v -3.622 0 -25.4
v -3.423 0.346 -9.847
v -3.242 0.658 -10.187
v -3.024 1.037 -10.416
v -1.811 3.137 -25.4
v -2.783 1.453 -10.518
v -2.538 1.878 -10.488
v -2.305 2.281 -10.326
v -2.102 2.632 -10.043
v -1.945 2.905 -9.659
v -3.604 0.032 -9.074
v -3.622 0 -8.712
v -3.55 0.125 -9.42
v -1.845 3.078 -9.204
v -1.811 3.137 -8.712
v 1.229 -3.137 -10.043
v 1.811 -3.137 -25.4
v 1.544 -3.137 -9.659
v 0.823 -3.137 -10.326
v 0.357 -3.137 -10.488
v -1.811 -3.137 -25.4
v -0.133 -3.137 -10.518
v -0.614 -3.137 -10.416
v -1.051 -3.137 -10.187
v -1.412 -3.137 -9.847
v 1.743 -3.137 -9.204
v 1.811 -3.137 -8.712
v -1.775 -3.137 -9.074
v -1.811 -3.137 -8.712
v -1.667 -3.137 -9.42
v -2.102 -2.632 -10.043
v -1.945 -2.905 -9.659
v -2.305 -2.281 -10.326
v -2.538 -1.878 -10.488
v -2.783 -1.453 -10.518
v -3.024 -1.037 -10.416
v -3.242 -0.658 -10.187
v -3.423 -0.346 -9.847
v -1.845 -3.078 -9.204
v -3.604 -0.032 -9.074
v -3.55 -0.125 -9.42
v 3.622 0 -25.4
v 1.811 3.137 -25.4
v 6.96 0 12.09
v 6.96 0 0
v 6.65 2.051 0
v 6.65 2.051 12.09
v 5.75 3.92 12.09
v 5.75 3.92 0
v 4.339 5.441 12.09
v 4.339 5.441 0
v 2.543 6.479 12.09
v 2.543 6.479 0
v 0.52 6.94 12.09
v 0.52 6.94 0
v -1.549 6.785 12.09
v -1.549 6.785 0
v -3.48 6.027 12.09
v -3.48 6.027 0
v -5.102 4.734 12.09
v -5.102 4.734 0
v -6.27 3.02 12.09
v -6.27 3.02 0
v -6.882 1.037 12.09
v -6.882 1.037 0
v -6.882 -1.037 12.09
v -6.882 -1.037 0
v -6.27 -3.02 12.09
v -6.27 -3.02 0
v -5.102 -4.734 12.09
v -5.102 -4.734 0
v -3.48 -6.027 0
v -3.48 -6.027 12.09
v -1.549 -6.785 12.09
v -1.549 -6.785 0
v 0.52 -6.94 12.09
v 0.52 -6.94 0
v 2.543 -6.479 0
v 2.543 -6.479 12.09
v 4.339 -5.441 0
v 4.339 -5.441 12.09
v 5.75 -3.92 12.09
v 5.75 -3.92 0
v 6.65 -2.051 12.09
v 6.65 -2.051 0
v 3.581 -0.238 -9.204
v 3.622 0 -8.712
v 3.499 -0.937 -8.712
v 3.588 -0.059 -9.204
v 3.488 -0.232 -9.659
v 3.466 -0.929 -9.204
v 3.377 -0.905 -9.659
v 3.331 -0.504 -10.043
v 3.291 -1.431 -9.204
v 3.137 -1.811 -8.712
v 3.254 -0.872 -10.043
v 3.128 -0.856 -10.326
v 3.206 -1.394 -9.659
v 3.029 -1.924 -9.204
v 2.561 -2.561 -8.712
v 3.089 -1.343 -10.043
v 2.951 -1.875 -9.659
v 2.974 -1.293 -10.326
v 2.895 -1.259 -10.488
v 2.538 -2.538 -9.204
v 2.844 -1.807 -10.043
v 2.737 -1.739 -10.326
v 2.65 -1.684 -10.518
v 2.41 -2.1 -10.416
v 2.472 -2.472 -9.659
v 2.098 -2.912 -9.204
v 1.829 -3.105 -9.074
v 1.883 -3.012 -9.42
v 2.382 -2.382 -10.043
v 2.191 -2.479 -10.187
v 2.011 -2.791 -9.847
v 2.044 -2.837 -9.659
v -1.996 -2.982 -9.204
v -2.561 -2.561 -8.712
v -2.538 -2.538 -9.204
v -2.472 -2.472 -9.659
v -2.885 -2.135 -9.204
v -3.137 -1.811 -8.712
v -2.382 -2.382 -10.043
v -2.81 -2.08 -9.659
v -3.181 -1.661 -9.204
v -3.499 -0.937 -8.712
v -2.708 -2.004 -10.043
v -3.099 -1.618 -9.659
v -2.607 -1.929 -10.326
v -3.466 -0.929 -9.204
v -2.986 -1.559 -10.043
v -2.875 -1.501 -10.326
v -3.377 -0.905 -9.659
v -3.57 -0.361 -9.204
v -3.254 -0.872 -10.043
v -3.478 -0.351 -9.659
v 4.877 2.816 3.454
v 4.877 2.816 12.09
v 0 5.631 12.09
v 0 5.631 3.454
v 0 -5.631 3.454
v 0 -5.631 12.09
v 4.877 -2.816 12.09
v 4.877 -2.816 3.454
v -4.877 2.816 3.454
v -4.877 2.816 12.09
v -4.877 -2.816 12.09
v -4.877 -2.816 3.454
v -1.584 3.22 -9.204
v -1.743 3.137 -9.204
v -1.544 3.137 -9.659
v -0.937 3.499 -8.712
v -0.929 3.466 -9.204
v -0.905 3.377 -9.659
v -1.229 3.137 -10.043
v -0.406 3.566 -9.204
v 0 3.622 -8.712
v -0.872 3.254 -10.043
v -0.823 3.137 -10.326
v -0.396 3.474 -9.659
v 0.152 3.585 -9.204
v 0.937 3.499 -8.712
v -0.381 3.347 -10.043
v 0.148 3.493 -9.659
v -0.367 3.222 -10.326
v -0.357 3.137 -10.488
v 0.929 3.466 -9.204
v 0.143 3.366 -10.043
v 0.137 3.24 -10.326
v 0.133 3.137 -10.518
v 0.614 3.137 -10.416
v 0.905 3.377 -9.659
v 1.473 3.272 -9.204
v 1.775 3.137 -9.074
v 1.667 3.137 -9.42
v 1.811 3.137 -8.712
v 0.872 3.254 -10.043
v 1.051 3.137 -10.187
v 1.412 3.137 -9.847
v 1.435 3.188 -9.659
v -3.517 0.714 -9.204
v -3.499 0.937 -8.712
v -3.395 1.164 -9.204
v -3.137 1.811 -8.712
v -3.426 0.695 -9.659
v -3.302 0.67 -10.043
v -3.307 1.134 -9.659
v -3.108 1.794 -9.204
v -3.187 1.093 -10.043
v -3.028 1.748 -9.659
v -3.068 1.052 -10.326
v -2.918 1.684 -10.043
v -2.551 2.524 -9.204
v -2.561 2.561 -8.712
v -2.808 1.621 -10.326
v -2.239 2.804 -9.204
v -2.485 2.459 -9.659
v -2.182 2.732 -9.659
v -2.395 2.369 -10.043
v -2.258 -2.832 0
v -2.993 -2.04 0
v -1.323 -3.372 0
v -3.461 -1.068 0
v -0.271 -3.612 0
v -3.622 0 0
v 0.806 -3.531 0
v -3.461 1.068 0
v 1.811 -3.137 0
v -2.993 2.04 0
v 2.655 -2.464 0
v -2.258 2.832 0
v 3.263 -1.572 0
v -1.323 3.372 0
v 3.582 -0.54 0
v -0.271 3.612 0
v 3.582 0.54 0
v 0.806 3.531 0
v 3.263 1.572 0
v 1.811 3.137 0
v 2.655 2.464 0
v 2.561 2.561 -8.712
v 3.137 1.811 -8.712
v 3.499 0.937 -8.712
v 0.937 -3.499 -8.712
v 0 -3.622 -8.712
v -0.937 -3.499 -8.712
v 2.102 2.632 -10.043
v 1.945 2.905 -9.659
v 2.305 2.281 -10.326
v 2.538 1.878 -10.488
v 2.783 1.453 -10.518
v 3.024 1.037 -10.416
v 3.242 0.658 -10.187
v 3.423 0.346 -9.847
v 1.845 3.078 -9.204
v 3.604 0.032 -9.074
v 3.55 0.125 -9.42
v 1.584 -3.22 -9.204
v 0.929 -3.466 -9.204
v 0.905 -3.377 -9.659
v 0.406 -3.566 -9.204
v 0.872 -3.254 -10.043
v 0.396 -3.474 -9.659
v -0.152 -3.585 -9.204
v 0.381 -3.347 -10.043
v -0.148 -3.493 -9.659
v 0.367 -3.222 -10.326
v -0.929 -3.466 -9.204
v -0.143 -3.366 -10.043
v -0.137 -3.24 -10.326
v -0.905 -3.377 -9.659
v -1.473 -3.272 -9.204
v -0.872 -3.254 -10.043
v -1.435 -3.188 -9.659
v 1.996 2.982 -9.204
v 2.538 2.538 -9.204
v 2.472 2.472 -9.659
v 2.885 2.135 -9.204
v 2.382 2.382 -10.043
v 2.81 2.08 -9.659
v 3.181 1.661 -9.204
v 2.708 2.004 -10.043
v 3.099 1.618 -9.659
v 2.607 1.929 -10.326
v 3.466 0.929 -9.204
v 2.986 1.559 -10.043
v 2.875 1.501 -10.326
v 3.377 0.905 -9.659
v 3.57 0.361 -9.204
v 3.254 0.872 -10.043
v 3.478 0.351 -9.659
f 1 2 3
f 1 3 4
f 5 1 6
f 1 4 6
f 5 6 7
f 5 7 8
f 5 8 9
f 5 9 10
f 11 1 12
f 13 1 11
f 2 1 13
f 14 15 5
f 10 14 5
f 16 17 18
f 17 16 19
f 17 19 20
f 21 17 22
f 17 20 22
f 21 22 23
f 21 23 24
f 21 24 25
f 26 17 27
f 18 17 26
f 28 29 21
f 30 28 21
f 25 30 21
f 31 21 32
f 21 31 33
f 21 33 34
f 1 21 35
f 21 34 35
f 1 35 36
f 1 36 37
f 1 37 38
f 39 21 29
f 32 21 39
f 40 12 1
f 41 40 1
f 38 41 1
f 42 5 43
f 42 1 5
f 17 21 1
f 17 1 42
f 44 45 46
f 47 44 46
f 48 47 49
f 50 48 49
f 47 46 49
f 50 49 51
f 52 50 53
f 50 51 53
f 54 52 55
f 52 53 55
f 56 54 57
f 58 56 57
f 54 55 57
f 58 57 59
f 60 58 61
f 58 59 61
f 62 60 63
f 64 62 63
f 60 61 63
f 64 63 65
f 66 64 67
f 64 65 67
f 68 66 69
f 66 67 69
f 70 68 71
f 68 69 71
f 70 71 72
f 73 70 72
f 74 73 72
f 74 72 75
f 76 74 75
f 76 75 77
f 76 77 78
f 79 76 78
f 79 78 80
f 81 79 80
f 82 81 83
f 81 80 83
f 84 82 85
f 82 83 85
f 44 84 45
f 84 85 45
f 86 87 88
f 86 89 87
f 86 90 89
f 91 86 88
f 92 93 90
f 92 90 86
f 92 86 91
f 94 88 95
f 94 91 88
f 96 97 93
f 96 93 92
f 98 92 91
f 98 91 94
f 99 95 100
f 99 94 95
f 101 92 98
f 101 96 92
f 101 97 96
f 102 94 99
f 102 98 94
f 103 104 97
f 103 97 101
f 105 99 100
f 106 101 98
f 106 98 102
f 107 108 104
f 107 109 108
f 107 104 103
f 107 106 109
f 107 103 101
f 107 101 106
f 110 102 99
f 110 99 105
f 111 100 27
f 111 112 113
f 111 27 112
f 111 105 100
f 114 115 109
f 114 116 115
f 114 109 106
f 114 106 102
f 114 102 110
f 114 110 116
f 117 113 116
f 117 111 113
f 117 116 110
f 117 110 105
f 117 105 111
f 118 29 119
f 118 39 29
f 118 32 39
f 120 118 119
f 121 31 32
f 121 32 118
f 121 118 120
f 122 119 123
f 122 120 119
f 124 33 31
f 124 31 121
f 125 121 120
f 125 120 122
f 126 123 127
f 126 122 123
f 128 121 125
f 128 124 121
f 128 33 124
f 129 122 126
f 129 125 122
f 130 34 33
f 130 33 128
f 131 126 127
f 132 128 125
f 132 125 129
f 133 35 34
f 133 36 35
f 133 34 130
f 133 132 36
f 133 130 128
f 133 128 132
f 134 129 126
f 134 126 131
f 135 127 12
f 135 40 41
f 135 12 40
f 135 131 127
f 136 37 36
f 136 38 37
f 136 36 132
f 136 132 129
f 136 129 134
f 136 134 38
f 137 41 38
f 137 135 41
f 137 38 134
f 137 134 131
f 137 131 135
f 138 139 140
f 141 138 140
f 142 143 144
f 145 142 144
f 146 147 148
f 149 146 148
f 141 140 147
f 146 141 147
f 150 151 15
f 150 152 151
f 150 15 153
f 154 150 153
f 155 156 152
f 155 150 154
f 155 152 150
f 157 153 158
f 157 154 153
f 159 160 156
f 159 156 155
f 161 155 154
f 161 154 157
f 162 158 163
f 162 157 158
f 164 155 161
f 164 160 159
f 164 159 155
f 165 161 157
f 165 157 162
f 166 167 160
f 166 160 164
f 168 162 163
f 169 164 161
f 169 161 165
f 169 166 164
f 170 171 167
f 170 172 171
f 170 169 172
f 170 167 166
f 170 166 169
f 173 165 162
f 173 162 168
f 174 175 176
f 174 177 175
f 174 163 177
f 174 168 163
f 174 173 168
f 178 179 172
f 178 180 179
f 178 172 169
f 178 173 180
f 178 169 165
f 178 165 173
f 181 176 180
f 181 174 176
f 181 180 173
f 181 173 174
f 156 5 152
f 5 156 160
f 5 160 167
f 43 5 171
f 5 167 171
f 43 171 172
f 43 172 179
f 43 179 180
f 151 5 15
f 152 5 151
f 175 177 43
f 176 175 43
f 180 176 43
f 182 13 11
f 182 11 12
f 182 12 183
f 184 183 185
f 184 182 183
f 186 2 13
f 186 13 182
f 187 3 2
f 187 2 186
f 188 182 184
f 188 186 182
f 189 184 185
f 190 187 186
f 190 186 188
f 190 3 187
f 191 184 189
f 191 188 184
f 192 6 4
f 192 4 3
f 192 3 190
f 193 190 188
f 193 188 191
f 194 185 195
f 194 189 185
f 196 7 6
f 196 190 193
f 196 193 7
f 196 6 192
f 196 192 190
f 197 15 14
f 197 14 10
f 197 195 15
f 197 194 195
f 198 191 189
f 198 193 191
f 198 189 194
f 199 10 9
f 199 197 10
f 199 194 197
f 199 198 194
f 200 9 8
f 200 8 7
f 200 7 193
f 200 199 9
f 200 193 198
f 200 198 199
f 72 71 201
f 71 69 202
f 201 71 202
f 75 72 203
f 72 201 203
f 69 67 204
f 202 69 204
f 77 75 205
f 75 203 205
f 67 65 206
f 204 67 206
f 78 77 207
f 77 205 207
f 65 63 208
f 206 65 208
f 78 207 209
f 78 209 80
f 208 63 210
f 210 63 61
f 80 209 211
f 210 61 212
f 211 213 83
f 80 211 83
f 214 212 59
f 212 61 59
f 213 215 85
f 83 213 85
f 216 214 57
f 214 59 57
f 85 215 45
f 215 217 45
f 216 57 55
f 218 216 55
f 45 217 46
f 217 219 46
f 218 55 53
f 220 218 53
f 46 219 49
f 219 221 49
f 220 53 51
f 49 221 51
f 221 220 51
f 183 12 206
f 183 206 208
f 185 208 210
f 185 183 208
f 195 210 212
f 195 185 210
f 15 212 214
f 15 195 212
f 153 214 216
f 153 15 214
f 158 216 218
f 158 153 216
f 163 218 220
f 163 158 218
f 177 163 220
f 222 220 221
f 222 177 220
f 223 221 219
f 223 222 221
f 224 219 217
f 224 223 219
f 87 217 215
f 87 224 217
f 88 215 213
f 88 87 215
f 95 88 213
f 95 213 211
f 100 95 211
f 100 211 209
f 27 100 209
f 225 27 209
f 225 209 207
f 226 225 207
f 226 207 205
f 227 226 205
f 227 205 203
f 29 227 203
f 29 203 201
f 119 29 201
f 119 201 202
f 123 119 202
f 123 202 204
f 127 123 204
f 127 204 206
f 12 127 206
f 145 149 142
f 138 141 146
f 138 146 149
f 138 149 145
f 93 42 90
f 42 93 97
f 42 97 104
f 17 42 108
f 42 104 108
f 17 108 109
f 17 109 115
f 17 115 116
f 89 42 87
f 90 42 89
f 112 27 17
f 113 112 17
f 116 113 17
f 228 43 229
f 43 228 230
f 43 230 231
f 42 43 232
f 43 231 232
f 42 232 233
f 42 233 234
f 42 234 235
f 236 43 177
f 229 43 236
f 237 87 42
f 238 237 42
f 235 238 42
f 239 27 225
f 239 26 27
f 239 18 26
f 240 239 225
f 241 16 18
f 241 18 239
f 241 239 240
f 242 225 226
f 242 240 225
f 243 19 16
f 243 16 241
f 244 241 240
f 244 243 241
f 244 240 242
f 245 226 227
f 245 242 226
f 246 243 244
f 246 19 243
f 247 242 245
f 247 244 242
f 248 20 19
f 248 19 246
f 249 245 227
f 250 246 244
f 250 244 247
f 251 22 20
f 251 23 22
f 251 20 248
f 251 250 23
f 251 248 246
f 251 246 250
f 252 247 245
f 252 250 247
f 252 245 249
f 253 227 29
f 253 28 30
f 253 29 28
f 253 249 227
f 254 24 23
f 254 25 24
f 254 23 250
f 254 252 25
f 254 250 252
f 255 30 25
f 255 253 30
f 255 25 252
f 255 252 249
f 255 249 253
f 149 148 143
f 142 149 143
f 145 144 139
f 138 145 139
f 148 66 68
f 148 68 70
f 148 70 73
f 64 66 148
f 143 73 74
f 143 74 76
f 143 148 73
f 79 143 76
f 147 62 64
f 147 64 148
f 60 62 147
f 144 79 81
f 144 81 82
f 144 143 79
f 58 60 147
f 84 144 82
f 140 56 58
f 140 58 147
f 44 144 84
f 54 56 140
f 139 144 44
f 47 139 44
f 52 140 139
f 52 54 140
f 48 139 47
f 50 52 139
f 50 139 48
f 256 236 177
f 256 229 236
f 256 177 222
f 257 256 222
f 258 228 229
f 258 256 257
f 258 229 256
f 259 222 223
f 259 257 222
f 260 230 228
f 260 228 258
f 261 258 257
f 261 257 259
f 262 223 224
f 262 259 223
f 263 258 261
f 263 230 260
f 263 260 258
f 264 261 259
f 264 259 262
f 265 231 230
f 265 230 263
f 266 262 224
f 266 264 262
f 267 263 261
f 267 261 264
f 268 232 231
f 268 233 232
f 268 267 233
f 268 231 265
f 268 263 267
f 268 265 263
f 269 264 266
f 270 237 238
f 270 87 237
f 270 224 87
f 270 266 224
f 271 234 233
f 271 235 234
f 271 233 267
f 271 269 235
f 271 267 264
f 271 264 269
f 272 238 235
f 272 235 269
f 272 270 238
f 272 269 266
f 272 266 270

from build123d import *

# Parameters (mm, degrees)
F0_R     = 6.9596
F1_DEPTH = 12.0904
F3_DEPTH = 8.636
F5_DEPTH = 25.4


with BuildPart() as f1:
    # F0 (on Top) → F1 (new body)
    with BuildSketch(Plane.XY):
        Circle(F0_R)
    extrude(amount=F1_DEPTH)

    # F2 (on face) → F3 (cut)
    with BuildSketch(Plane.XY.offset(12.0904)):
        Polygon((4.8768, -2.815622), (4.8768, 2.815622), (0, 5.631244), (-4.8768, 2.815622), (-4.8768, -2.815622), (0, -5.631244), align=None)
    extrude(amount=-F3_DEPTH, mode=Mode.SUBTRACT)

    # F4 (on face) → F5 (join)
    with BuildSketch(Plane(origin=(0, 0, 0), x_dir=(1, 0, 0), z_dir=(0, 0, -1))):
        Polygon((-1.81109, -3.1369), (1.81109, -3.1369), (3.62218, 0), (1.81109, 3.1369), (-1.81109, 3.1369), (-3.62218, 0), align=None)
    extrude(amount=F5_DEPTH)

    # F6 (on Front) → F7 (revolve)
    with BuildSketch(Plane.XZ):
        with BuildLine():
            Line((0, 0), (-3.62218, 0))
            Line((-3.62218, 0), (-3.62218, -8.7122))
            ThreePointArc((-3.62218, -8.7122), (-2.561268, -11.273468), (0, -12.33438))
            Line((0, -12.33438), (0, 0))
        make_face()
    revolve(axis=Axis((0, 0, -6.16719), (0, 0, -1)))


solid = f1.part
